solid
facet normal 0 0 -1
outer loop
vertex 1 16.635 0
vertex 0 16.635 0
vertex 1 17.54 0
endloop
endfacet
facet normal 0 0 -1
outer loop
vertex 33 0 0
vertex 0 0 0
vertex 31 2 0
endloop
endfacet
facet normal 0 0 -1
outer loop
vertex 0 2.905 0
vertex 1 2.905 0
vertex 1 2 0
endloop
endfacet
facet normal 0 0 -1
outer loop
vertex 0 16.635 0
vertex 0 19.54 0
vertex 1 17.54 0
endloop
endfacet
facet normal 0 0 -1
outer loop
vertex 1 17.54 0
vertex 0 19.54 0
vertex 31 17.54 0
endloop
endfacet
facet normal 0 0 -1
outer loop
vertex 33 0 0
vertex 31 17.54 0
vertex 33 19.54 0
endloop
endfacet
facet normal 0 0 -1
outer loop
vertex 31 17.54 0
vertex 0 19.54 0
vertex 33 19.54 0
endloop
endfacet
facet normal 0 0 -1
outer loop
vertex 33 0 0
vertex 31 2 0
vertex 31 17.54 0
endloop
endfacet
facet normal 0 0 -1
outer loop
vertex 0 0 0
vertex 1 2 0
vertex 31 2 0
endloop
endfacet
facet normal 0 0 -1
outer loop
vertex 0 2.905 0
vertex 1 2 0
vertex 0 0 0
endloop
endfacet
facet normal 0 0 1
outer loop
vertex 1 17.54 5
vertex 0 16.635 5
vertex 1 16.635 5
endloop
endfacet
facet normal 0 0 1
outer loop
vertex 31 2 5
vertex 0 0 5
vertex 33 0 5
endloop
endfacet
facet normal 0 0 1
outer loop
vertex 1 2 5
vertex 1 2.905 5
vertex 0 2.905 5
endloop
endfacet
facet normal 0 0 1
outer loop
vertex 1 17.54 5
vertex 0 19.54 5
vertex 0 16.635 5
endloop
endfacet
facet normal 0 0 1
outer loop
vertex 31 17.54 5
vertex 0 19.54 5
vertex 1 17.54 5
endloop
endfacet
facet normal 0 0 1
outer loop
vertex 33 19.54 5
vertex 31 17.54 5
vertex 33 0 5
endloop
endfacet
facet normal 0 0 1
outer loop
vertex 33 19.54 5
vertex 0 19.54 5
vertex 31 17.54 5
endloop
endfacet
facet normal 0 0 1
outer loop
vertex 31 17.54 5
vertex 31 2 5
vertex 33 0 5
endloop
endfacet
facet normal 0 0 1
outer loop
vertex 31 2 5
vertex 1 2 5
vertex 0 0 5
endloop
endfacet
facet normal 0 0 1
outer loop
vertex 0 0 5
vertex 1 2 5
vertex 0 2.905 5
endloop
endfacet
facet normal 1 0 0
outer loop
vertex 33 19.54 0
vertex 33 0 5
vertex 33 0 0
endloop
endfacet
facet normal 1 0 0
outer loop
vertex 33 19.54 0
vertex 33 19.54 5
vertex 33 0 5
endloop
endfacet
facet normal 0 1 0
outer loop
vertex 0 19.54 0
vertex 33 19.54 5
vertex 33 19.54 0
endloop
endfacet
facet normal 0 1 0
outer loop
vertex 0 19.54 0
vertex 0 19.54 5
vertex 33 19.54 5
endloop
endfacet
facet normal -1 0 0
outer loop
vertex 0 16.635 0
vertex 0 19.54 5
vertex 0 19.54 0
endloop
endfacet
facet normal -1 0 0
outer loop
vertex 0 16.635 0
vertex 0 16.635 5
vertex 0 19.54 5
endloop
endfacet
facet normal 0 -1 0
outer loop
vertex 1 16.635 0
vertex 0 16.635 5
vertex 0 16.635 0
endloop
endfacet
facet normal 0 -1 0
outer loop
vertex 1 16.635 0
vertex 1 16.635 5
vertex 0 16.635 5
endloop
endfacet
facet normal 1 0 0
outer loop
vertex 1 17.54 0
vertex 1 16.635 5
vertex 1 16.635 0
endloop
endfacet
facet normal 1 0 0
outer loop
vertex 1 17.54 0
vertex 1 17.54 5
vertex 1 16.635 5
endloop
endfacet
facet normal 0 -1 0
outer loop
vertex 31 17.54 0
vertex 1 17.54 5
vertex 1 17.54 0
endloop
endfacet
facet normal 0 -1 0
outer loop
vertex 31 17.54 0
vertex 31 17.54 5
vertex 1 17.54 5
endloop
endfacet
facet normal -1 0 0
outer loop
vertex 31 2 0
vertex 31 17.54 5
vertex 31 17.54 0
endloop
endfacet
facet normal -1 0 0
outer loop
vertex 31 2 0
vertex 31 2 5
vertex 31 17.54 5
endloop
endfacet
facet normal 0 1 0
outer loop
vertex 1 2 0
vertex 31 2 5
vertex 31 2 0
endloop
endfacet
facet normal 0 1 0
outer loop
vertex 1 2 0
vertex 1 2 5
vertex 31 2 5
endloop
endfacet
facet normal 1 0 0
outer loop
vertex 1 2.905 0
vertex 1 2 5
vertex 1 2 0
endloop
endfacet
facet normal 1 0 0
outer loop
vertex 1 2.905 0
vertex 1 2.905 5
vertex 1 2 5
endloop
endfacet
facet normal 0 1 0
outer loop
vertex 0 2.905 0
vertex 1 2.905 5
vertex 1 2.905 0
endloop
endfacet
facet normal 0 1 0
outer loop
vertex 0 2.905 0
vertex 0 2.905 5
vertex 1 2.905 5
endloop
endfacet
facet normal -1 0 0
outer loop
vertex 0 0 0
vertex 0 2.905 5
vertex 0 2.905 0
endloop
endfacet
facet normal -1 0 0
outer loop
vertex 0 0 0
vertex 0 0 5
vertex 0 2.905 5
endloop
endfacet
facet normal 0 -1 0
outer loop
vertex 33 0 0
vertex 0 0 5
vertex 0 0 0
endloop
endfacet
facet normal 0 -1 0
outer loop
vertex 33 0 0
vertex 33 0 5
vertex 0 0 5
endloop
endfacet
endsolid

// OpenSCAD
end_height = 1; // mm
end_width = 13.73;

//inner_width = 14.56;
inner_width = 15.54;
height = 30;
thickness = 2;

linear_extrude(5)
difference() {
  square([height+thickness+end_height, inner_width+thickness*2]);
  
  translate([end_height, thickness])
  square([height, inner_width]);
  
  translate([0, (inner_width-end_width)/2+thickness])
  square([height, end_width]);
}
